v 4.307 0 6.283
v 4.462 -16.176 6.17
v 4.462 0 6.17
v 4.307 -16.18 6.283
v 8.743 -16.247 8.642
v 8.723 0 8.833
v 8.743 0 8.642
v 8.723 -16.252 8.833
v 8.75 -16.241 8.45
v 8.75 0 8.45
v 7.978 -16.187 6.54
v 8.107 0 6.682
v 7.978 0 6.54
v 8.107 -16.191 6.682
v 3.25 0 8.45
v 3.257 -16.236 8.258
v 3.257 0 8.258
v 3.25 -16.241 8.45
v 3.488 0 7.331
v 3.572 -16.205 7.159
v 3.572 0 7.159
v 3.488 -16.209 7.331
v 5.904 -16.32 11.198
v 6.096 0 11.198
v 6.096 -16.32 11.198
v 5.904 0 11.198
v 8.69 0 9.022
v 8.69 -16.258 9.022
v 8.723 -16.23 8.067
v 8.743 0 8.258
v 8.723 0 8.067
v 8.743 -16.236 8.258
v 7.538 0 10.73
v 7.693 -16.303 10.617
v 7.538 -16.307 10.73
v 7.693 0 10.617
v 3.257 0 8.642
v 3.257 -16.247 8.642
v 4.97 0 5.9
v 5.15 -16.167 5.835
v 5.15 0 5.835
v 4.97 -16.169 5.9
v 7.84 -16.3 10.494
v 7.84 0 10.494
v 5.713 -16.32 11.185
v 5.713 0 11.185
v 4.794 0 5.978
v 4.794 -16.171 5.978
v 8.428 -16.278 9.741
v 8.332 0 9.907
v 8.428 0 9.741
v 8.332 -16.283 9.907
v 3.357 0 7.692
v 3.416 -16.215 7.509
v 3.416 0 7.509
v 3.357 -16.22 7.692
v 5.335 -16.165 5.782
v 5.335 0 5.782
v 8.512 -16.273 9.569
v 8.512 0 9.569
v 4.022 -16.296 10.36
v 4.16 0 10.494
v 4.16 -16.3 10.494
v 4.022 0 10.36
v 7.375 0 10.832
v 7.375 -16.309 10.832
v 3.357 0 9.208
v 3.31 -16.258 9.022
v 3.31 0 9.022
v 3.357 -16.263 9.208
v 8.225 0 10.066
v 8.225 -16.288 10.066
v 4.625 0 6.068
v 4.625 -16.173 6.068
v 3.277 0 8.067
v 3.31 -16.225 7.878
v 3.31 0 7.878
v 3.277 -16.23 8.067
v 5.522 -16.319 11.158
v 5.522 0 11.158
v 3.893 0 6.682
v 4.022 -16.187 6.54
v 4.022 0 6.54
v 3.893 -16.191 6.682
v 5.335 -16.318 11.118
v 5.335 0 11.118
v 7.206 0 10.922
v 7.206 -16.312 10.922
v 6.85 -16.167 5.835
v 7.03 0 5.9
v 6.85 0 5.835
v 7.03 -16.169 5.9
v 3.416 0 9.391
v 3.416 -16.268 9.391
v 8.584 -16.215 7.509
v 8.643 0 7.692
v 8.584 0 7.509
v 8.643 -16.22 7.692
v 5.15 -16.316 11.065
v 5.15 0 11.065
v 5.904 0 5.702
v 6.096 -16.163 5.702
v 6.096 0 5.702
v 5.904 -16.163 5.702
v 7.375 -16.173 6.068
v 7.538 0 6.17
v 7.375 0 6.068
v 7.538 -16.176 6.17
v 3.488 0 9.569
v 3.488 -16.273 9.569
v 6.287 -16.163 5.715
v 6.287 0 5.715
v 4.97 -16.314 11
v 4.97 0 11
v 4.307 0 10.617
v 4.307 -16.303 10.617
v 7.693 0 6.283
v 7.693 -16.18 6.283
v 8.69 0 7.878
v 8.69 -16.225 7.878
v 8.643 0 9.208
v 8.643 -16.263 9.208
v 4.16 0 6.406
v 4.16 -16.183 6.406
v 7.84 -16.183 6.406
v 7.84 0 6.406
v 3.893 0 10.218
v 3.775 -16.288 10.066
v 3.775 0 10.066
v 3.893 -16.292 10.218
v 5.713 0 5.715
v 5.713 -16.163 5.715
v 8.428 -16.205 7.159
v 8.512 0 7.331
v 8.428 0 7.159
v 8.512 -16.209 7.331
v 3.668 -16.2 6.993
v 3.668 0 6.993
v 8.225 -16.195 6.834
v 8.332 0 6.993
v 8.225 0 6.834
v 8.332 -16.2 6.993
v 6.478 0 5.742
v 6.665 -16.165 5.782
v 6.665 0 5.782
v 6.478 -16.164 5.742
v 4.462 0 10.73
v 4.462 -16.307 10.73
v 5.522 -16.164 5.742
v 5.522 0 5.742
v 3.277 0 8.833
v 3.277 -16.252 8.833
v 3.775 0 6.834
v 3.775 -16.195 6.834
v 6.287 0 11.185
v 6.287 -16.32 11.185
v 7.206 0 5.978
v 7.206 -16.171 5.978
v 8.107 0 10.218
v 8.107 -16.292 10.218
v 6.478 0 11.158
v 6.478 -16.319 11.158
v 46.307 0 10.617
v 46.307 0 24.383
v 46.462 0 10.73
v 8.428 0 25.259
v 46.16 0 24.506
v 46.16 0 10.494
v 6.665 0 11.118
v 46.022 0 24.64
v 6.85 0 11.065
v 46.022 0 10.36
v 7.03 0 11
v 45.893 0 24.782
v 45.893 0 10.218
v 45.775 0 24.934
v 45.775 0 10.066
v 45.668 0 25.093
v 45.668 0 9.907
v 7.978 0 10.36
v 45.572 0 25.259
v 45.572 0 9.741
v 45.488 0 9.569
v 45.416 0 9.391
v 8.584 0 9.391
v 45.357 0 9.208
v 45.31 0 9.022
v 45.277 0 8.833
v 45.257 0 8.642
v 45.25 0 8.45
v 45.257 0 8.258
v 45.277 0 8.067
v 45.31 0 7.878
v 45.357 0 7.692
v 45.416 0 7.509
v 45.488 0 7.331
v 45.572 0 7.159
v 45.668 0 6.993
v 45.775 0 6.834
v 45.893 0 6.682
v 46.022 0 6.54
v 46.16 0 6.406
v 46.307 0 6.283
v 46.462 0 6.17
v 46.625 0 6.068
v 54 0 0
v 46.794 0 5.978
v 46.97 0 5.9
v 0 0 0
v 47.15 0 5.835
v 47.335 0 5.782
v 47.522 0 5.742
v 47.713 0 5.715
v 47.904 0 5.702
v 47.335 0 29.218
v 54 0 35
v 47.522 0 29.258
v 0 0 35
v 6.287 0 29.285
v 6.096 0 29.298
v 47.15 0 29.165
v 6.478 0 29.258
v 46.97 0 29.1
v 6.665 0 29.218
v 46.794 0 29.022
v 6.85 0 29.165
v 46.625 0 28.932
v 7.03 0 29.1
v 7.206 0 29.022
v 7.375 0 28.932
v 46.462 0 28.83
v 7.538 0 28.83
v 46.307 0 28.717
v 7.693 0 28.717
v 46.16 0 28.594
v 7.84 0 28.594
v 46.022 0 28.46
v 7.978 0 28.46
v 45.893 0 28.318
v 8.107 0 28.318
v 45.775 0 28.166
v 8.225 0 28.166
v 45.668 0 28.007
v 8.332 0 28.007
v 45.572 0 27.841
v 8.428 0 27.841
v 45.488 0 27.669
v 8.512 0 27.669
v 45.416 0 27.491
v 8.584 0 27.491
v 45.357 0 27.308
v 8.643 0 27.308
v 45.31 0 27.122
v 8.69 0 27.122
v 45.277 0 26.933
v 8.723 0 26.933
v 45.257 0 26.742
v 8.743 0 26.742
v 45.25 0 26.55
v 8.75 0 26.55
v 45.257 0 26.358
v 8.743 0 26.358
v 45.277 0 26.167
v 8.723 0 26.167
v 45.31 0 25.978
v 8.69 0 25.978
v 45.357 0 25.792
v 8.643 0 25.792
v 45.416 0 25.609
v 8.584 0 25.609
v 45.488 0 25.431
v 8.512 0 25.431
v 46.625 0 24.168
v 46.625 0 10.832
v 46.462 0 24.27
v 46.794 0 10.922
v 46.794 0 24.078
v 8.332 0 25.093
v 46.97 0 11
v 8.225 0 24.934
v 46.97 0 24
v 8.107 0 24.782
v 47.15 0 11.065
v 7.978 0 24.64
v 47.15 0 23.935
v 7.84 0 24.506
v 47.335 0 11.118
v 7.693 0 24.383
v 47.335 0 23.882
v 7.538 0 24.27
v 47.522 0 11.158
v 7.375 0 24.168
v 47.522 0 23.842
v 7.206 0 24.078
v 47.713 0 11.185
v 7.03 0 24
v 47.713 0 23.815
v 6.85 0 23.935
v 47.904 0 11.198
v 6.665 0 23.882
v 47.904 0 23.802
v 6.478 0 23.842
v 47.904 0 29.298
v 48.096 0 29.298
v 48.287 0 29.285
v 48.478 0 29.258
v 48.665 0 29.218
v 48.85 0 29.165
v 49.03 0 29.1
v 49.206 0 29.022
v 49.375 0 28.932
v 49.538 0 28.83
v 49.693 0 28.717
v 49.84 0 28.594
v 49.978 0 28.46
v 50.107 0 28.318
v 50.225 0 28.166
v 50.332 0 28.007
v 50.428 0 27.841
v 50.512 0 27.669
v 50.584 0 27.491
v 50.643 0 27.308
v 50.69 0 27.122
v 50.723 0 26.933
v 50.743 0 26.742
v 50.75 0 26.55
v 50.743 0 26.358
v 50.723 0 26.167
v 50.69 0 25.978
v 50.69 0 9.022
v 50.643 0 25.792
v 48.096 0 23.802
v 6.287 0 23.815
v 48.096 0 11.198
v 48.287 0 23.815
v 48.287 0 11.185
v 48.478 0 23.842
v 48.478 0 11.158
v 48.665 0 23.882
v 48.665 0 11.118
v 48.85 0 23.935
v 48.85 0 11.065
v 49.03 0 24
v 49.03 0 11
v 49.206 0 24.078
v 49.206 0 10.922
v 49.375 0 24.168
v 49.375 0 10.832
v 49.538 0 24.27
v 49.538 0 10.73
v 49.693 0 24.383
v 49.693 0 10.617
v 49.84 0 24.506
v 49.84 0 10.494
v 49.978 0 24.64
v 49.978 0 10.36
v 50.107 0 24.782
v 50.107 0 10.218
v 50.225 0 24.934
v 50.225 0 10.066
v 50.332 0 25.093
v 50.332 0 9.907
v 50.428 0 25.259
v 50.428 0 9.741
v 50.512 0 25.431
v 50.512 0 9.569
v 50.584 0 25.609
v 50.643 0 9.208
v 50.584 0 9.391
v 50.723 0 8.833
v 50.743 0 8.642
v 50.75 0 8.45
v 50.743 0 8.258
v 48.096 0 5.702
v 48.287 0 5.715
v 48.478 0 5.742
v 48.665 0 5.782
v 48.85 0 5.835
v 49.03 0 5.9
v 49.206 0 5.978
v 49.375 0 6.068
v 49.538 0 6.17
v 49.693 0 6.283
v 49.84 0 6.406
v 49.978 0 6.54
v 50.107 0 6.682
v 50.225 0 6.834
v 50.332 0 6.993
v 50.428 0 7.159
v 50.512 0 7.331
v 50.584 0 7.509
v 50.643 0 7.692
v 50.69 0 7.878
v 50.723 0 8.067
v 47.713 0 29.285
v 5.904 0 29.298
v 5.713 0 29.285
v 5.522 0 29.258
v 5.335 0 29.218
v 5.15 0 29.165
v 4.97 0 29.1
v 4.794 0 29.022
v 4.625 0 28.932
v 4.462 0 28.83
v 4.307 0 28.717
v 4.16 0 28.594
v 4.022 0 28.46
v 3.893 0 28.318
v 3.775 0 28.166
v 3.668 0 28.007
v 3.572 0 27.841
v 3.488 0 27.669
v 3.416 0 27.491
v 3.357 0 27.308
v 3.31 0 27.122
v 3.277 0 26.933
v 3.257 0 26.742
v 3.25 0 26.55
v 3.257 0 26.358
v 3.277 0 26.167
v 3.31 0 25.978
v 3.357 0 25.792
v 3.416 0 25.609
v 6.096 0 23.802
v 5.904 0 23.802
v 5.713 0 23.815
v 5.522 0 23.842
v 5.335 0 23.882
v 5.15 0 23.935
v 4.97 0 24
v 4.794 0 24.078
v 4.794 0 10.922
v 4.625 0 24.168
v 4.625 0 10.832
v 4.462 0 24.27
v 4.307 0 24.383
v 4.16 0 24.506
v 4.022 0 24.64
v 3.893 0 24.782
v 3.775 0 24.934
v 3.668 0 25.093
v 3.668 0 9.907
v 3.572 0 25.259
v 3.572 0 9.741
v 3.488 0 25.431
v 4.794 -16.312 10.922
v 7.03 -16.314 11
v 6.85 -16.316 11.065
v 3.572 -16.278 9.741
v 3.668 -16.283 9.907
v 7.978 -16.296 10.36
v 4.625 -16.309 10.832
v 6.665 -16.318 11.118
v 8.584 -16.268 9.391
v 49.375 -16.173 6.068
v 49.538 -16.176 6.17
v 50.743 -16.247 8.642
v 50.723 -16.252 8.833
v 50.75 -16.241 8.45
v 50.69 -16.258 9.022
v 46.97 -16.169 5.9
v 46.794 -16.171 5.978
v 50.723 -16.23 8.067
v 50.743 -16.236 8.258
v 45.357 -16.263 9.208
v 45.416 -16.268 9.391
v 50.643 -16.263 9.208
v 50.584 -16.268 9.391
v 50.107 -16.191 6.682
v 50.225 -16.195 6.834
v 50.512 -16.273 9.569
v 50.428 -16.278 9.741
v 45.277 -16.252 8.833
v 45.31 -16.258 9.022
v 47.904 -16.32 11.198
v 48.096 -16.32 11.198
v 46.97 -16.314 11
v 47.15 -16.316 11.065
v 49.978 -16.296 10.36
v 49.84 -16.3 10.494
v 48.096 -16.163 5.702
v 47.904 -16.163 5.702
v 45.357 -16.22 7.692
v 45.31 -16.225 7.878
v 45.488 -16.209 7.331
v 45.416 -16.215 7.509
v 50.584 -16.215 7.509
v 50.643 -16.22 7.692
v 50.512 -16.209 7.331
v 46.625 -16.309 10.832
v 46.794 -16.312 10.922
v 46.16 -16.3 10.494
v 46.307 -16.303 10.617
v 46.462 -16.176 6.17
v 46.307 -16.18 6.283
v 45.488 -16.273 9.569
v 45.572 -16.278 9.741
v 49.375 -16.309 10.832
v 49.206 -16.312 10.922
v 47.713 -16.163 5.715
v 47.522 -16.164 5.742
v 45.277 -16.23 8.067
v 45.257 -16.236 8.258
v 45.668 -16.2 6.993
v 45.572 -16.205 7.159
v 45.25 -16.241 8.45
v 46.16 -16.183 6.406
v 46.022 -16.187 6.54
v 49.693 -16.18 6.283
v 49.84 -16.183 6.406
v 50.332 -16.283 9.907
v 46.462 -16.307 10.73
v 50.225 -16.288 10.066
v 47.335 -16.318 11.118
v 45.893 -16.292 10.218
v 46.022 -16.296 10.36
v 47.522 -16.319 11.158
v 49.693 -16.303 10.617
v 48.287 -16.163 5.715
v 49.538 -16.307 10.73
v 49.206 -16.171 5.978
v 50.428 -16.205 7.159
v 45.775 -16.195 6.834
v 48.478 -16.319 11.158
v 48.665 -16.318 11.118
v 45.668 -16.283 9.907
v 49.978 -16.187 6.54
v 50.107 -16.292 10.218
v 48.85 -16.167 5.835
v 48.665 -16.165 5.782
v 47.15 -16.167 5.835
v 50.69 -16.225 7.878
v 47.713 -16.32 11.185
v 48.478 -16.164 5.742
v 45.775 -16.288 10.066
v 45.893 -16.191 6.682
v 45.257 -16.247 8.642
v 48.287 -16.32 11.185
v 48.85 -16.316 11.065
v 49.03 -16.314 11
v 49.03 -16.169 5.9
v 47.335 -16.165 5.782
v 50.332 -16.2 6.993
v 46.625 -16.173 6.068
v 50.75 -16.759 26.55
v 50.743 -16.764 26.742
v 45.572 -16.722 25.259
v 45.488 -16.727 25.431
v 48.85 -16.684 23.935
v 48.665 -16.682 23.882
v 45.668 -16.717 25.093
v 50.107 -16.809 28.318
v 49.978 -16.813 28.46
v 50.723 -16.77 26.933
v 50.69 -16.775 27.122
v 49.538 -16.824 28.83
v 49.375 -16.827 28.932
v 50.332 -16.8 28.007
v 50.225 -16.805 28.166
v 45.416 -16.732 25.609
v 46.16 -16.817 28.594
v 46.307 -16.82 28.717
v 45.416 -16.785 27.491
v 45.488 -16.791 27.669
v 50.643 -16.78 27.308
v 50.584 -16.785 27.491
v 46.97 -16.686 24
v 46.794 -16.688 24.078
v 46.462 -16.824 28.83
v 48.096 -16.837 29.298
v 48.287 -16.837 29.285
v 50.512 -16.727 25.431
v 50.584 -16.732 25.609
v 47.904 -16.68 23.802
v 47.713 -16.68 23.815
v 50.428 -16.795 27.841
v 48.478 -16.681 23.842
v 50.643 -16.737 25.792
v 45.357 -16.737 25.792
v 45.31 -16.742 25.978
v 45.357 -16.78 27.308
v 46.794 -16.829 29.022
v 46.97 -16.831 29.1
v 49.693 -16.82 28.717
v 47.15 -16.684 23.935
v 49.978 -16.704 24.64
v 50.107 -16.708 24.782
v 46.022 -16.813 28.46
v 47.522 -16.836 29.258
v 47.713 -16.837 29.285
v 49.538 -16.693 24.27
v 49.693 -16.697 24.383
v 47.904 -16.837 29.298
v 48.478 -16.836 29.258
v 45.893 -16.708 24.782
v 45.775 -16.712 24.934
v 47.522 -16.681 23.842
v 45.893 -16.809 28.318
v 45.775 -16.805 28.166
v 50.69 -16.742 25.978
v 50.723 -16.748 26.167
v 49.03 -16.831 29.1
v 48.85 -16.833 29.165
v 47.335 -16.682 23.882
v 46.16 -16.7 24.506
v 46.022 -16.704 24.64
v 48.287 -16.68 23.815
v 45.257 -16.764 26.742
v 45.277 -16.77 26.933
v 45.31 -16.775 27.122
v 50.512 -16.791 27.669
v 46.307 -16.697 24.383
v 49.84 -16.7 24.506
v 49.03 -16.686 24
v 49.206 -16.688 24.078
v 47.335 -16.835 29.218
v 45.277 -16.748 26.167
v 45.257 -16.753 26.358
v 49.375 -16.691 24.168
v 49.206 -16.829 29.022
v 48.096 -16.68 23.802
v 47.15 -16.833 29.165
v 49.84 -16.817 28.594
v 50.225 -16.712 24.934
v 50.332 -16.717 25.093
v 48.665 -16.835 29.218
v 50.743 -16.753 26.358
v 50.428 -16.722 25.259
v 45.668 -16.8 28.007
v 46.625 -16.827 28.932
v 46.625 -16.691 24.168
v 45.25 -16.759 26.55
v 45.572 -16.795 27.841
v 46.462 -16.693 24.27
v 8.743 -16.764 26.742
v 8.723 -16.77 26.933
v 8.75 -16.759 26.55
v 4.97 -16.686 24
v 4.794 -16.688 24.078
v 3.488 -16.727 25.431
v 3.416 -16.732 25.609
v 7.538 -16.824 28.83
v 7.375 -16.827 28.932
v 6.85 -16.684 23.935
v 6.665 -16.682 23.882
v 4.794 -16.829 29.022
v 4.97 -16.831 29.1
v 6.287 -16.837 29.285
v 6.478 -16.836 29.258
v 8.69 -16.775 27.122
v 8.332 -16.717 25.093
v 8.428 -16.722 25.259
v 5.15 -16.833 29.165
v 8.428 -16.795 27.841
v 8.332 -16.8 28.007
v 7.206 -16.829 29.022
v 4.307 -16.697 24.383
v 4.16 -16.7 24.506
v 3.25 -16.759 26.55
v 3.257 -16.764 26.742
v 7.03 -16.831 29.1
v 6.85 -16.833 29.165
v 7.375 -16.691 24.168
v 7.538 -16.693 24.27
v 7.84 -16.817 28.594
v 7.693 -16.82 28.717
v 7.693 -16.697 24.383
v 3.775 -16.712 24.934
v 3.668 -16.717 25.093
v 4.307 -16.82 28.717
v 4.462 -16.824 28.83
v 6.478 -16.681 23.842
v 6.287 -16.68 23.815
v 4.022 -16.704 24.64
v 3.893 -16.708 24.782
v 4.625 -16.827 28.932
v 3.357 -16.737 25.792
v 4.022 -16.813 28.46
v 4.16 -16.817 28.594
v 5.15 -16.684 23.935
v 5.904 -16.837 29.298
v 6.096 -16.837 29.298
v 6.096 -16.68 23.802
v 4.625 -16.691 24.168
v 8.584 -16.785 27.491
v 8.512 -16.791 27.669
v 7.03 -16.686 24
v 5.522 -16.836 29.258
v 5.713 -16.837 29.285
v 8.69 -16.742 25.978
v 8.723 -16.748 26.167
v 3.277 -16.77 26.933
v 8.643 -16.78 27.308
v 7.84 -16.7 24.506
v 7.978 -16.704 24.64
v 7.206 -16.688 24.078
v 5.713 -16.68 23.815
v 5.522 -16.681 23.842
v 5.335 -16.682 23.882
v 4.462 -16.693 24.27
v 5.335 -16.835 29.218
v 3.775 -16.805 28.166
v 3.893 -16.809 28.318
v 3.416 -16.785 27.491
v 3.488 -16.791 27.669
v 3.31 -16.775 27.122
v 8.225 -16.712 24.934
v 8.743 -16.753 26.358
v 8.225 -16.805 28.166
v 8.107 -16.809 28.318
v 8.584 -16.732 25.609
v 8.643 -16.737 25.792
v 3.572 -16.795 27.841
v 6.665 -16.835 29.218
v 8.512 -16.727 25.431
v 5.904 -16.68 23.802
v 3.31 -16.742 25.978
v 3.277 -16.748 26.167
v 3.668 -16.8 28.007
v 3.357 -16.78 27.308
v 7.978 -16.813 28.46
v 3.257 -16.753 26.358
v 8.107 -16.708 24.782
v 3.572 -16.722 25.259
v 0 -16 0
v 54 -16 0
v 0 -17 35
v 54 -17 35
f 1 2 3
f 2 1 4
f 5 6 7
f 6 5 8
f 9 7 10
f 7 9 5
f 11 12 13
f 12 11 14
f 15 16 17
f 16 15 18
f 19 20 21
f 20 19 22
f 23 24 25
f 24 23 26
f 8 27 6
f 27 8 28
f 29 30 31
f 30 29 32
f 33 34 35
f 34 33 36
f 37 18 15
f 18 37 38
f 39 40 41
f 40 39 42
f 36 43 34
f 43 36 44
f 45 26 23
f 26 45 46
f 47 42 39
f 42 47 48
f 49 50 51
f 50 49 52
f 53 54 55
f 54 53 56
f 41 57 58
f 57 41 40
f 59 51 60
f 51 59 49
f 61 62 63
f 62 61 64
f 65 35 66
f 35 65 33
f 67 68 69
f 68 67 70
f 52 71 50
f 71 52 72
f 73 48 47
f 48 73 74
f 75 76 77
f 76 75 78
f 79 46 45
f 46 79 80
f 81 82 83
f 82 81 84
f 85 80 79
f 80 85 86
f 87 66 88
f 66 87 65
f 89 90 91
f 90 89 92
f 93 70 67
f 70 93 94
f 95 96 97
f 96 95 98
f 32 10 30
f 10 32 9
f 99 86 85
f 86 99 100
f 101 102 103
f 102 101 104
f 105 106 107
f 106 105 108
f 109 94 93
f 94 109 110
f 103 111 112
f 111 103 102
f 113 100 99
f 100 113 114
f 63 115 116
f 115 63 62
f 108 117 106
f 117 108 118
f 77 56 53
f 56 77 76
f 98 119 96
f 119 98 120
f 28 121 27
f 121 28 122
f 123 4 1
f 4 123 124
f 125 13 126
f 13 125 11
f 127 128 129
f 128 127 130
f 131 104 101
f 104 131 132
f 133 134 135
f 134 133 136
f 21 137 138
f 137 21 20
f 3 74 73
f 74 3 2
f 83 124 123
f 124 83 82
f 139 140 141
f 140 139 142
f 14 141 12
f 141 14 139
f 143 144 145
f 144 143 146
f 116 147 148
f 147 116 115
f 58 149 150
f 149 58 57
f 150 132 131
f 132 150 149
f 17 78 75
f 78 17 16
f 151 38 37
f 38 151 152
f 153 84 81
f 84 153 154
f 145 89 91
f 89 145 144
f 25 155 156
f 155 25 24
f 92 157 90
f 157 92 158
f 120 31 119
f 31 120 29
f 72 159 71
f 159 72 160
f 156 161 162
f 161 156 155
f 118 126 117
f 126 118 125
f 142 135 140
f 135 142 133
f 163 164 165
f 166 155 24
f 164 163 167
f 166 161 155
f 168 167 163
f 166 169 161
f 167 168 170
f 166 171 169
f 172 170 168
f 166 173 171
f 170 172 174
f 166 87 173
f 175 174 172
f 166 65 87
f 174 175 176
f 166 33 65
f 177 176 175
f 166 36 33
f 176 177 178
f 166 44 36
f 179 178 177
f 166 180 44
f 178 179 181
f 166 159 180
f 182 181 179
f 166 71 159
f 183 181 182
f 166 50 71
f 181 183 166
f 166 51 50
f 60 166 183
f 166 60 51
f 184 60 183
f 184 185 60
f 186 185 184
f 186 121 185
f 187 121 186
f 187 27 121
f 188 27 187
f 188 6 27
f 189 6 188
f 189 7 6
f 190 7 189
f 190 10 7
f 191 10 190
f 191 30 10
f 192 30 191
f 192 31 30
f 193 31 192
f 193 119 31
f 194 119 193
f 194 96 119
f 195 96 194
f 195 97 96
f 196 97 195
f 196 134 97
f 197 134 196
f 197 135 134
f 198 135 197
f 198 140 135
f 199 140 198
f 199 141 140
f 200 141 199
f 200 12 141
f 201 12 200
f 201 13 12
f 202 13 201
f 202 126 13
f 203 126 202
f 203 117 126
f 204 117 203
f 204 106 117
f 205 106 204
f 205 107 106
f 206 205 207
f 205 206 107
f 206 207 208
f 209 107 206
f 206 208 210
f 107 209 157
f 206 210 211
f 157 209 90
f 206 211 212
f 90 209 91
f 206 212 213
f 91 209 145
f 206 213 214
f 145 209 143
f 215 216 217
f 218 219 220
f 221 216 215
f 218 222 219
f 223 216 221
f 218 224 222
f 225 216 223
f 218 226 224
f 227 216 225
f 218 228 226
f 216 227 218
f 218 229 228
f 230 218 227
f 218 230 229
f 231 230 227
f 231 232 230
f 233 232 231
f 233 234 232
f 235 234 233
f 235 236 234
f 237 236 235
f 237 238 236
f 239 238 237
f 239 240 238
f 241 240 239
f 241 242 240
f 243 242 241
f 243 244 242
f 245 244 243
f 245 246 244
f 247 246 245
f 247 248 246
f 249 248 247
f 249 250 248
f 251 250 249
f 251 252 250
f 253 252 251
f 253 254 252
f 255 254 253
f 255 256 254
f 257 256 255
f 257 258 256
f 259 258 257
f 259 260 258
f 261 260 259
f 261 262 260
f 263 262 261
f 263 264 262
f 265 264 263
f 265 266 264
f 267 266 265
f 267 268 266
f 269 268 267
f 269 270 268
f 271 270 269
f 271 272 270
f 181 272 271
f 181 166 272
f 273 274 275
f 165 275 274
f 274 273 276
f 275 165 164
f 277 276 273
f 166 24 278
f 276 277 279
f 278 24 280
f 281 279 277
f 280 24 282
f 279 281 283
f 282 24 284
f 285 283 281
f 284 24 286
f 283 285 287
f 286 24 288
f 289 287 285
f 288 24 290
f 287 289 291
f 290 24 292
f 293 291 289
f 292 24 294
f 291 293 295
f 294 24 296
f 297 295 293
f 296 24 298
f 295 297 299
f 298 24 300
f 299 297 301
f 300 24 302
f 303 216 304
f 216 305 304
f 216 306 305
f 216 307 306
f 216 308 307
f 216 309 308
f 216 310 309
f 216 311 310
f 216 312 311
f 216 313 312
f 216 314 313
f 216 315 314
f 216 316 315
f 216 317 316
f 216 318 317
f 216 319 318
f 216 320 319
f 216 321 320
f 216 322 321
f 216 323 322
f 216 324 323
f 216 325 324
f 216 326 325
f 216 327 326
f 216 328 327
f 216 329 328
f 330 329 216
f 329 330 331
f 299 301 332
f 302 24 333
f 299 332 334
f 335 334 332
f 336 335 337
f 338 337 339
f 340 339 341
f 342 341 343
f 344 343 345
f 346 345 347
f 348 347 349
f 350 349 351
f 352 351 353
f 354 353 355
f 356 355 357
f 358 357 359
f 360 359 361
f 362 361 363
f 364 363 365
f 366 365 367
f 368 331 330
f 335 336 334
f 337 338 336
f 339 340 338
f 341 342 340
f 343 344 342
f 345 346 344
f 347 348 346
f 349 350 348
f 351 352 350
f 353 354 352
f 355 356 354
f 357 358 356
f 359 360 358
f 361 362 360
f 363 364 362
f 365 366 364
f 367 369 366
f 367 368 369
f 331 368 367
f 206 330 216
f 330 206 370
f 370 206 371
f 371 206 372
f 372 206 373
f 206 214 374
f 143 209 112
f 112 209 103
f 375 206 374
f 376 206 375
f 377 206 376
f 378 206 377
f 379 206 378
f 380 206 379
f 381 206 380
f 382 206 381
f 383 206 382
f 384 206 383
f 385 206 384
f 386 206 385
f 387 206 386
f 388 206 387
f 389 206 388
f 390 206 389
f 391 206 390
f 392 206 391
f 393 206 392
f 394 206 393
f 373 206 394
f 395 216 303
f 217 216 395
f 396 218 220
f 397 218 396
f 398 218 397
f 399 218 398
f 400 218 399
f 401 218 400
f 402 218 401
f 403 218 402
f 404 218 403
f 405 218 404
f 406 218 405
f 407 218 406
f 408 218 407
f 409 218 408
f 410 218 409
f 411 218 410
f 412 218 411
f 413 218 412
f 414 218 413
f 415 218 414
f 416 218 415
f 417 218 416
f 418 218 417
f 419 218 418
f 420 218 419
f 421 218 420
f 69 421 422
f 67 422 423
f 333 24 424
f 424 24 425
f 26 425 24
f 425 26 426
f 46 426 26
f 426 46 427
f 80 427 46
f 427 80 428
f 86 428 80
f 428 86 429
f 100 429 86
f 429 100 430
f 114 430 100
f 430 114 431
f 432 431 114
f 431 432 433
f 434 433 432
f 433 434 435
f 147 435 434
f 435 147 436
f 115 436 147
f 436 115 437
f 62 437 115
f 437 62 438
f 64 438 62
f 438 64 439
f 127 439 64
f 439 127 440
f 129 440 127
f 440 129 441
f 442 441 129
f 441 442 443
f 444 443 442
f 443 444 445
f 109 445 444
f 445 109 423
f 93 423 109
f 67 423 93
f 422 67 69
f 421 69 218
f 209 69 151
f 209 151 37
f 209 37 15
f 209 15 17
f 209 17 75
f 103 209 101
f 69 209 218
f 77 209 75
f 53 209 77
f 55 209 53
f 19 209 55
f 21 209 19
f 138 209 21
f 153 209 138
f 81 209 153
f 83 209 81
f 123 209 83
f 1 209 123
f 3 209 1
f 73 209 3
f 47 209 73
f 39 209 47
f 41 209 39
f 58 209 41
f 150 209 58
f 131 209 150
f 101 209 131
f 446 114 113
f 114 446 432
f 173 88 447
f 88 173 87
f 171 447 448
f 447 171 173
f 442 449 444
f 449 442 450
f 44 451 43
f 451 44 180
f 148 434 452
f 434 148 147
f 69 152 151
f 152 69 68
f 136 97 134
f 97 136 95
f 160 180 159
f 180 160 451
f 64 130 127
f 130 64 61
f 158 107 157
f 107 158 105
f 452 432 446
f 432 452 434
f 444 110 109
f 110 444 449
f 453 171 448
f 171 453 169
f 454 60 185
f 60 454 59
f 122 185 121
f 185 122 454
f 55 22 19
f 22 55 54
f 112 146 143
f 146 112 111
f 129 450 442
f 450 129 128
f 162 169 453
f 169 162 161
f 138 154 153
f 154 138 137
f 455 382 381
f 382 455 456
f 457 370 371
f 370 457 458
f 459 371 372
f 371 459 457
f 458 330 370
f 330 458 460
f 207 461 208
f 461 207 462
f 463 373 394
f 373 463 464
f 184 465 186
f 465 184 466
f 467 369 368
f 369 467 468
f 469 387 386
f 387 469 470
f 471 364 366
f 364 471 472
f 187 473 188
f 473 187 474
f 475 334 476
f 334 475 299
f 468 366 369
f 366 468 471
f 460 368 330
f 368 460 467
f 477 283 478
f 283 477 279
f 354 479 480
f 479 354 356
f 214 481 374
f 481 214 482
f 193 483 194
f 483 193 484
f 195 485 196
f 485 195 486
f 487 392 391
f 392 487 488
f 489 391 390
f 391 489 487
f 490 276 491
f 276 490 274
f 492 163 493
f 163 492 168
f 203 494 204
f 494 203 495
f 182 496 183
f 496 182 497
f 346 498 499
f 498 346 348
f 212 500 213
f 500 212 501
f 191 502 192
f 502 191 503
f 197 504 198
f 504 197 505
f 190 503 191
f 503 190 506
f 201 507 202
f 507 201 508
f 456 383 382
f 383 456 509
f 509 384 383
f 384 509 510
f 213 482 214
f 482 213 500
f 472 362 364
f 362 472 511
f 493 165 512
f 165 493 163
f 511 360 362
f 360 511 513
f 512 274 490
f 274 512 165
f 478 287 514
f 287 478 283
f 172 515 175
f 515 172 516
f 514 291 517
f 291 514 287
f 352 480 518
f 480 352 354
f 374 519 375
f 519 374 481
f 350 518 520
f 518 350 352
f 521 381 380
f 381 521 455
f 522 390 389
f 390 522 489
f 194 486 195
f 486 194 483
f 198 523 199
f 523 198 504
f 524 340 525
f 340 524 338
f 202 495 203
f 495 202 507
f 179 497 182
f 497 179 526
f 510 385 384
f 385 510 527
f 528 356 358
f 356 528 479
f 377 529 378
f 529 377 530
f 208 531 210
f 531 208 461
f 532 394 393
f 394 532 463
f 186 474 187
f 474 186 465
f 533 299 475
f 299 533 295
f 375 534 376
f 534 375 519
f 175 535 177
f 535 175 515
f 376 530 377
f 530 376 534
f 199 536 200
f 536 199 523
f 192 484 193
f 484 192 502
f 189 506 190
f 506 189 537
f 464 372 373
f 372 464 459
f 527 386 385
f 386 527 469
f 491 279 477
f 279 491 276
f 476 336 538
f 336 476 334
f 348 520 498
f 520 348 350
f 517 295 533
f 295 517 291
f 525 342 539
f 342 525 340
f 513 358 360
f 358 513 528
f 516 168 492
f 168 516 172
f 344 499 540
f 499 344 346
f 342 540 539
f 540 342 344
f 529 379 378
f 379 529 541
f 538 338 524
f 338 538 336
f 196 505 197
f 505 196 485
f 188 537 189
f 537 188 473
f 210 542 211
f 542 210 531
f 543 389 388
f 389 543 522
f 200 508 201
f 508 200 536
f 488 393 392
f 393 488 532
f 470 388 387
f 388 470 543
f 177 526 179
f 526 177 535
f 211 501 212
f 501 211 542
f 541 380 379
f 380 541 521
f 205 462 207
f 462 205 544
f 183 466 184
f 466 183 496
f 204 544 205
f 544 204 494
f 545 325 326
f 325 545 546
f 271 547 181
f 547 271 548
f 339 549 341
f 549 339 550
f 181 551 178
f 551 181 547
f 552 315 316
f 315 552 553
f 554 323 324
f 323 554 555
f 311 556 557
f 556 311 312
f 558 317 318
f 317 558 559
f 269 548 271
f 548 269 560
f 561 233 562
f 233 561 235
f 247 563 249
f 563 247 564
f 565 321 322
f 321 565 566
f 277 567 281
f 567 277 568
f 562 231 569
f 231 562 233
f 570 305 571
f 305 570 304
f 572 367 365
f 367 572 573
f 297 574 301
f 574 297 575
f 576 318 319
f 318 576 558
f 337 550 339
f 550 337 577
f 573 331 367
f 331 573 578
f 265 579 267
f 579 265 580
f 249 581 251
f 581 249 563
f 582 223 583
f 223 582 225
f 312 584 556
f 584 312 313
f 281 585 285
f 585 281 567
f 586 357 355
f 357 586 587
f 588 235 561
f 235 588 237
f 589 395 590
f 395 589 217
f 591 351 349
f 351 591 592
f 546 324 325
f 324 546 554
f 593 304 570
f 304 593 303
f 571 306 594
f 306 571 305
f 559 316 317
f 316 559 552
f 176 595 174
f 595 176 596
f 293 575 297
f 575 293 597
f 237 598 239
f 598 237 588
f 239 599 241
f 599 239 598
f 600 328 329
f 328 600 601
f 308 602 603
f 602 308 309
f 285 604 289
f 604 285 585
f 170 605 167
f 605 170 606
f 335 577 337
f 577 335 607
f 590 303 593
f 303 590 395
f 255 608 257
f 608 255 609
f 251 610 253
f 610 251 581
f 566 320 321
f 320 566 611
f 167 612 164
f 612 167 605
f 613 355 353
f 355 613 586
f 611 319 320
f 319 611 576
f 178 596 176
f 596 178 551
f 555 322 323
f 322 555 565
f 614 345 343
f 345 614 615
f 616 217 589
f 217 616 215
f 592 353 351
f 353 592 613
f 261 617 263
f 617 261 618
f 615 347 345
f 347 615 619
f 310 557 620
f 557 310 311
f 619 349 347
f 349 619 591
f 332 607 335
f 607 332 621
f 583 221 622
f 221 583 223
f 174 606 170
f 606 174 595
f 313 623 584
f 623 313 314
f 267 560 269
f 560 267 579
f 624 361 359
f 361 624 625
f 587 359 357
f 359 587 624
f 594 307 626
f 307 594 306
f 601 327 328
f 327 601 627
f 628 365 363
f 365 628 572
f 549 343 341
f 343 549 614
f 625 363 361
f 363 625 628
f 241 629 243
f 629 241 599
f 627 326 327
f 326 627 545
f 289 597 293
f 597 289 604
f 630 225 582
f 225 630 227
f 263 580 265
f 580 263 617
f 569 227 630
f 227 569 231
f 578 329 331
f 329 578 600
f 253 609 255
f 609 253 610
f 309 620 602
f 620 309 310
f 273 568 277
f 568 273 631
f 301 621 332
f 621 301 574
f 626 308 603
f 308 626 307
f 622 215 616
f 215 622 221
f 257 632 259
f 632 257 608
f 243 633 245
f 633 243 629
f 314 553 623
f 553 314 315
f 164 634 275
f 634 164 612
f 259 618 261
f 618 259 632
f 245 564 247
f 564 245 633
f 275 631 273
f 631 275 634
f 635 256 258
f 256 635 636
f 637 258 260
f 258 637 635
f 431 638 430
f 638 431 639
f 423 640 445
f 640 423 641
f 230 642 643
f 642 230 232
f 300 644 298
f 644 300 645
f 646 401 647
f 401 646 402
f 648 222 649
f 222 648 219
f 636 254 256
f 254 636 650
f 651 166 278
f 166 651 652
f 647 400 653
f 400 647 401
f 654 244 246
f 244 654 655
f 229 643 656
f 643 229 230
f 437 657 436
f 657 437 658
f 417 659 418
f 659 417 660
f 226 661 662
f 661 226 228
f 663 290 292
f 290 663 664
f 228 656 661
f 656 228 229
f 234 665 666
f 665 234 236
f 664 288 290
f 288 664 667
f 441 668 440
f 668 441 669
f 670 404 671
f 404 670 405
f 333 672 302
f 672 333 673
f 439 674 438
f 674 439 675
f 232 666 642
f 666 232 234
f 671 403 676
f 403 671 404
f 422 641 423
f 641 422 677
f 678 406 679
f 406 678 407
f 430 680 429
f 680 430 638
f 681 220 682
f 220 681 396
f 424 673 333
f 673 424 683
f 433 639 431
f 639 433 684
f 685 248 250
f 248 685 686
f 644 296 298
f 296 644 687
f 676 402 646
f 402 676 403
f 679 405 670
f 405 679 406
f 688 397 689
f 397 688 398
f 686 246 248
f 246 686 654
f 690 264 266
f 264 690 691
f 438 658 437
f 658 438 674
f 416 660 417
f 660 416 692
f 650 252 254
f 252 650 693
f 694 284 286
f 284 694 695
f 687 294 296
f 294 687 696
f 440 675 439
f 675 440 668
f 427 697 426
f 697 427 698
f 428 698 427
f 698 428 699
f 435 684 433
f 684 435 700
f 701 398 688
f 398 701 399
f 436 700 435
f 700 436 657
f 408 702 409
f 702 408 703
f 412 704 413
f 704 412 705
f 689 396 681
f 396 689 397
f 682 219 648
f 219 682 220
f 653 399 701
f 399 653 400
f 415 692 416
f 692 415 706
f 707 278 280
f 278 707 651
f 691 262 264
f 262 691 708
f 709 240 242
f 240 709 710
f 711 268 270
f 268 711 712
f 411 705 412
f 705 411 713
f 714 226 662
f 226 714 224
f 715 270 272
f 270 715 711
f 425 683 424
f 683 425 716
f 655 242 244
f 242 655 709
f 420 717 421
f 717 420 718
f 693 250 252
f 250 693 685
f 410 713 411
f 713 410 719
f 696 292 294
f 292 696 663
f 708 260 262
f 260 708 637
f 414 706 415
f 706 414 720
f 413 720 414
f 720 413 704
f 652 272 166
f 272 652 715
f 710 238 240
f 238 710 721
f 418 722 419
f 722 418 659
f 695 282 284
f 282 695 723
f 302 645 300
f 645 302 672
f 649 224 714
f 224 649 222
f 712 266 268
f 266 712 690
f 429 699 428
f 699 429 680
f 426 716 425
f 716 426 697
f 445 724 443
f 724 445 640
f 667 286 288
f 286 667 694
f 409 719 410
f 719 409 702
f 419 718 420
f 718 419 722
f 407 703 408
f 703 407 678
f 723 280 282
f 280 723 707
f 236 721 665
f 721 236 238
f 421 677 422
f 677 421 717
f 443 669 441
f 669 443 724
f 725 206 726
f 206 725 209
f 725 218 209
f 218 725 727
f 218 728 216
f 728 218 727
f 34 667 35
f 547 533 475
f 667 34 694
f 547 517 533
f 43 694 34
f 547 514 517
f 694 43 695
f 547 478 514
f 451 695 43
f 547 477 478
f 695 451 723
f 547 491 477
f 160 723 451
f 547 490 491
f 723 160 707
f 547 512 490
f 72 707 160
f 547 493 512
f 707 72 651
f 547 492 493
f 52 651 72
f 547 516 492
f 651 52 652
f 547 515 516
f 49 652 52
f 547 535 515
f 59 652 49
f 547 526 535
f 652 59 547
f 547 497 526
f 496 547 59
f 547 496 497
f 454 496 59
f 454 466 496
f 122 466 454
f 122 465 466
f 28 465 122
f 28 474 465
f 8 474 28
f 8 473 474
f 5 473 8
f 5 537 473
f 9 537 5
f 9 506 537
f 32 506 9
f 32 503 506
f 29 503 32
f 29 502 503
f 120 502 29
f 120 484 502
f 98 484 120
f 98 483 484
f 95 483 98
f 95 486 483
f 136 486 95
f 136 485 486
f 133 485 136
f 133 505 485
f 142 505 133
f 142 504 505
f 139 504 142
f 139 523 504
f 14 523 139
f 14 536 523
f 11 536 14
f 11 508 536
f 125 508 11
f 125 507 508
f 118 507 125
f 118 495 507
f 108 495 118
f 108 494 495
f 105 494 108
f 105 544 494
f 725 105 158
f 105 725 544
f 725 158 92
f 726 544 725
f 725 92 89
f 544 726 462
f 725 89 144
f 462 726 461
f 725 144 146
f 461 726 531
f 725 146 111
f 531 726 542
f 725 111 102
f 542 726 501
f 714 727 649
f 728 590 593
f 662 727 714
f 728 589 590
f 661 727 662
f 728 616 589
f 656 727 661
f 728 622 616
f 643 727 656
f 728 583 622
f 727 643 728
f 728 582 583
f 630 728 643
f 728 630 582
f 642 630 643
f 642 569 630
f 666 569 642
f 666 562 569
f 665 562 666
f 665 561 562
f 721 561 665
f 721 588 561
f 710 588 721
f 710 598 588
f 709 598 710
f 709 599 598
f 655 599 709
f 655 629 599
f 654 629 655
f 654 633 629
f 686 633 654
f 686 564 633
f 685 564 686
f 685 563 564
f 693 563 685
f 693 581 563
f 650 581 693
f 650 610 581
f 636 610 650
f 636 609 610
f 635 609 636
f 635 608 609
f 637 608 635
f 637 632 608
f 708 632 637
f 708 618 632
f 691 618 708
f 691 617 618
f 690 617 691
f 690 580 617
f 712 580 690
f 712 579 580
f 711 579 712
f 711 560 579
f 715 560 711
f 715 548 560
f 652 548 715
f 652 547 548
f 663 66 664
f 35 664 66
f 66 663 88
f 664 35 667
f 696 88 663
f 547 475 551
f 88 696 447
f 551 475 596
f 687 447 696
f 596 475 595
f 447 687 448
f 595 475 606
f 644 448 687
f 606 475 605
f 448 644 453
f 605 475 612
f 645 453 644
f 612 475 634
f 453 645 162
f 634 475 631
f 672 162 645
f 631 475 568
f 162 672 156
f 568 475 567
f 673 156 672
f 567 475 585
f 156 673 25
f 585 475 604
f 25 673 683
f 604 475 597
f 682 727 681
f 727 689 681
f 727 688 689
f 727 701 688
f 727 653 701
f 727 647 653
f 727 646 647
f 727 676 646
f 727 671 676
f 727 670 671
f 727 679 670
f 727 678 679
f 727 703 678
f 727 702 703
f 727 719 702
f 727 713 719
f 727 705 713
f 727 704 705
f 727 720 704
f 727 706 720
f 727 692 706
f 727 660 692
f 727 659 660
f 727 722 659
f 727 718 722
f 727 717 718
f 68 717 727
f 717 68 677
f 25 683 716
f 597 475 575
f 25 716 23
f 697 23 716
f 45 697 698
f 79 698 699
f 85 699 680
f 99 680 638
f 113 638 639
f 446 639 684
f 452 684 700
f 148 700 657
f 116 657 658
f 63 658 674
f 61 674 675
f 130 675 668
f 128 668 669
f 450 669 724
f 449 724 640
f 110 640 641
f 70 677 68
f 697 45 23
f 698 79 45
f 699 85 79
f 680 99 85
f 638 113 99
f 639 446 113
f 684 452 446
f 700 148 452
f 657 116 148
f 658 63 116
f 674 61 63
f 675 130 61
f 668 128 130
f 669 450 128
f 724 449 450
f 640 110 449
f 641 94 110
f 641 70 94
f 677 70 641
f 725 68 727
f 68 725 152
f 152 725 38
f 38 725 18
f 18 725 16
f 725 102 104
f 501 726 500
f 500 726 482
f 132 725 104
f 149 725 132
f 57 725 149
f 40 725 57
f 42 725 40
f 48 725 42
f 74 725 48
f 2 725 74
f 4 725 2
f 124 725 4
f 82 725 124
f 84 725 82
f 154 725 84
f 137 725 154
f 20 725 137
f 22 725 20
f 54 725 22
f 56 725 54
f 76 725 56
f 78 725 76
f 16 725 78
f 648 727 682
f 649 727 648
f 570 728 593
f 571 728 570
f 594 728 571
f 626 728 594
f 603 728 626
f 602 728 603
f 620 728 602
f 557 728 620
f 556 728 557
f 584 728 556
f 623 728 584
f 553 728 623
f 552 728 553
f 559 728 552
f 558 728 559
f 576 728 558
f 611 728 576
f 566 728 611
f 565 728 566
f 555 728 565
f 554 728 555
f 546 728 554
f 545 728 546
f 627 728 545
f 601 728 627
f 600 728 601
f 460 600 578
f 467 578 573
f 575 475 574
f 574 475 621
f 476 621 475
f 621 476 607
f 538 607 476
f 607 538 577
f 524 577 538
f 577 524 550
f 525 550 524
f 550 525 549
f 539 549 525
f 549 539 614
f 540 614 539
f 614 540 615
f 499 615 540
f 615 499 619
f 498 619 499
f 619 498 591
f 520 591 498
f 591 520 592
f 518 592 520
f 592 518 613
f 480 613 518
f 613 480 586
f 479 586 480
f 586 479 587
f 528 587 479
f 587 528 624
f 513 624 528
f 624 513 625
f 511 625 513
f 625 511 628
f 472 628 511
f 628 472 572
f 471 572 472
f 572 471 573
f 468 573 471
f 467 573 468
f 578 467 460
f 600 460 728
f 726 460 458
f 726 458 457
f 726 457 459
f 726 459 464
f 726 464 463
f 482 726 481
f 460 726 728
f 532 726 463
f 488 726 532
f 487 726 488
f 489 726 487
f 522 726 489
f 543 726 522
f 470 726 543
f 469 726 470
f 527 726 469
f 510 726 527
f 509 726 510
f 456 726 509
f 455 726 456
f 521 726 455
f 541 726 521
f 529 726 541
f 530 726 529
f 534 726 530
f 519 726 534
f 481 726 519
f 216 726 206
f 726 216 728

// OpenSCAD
//hoch
h=35;
//breit
b=54;

p1=20;
p2=19;

p3=17;
p4=16;

p5=14;
p6=13;

$fn=90;

// Viereck aus vier Punkten (2D)
points = [
    [0, 0],    // Punkt 0
    [h, 0],   // Punkt 1
    [h, p4],  // Punkt 2
    [0, p3]  // Punkt 3
];

// "paths" macht die Verbindung explizit: 0->1->2->3->0
module adapter()
{
    color("silver")
translate([b,0,h])
rotate([0,90,180])
linear_extrude(b)
polygon(points = points, paths = [[0,1,2,3]]);
}

module loch()
{
color("red")
rotate([90,0,0])
cylinder(p1, d/2, d/2);
}


//loch-loch außen zu außen
ll=47.5;
//ll2
ll2=23.6;
//durchmesser loch
d=5.5;

module loecher()
{
loch();
translate([ll-d,0,0])
loch();
translate([ll-d,0,ll2-d])
loch();
translate([0,0,ll2-d])
loch();
}

difference() {
    adapter();

translate([(b-(ll-d))/2,0,(h-(ll2-d))/2])
loecher();
}
